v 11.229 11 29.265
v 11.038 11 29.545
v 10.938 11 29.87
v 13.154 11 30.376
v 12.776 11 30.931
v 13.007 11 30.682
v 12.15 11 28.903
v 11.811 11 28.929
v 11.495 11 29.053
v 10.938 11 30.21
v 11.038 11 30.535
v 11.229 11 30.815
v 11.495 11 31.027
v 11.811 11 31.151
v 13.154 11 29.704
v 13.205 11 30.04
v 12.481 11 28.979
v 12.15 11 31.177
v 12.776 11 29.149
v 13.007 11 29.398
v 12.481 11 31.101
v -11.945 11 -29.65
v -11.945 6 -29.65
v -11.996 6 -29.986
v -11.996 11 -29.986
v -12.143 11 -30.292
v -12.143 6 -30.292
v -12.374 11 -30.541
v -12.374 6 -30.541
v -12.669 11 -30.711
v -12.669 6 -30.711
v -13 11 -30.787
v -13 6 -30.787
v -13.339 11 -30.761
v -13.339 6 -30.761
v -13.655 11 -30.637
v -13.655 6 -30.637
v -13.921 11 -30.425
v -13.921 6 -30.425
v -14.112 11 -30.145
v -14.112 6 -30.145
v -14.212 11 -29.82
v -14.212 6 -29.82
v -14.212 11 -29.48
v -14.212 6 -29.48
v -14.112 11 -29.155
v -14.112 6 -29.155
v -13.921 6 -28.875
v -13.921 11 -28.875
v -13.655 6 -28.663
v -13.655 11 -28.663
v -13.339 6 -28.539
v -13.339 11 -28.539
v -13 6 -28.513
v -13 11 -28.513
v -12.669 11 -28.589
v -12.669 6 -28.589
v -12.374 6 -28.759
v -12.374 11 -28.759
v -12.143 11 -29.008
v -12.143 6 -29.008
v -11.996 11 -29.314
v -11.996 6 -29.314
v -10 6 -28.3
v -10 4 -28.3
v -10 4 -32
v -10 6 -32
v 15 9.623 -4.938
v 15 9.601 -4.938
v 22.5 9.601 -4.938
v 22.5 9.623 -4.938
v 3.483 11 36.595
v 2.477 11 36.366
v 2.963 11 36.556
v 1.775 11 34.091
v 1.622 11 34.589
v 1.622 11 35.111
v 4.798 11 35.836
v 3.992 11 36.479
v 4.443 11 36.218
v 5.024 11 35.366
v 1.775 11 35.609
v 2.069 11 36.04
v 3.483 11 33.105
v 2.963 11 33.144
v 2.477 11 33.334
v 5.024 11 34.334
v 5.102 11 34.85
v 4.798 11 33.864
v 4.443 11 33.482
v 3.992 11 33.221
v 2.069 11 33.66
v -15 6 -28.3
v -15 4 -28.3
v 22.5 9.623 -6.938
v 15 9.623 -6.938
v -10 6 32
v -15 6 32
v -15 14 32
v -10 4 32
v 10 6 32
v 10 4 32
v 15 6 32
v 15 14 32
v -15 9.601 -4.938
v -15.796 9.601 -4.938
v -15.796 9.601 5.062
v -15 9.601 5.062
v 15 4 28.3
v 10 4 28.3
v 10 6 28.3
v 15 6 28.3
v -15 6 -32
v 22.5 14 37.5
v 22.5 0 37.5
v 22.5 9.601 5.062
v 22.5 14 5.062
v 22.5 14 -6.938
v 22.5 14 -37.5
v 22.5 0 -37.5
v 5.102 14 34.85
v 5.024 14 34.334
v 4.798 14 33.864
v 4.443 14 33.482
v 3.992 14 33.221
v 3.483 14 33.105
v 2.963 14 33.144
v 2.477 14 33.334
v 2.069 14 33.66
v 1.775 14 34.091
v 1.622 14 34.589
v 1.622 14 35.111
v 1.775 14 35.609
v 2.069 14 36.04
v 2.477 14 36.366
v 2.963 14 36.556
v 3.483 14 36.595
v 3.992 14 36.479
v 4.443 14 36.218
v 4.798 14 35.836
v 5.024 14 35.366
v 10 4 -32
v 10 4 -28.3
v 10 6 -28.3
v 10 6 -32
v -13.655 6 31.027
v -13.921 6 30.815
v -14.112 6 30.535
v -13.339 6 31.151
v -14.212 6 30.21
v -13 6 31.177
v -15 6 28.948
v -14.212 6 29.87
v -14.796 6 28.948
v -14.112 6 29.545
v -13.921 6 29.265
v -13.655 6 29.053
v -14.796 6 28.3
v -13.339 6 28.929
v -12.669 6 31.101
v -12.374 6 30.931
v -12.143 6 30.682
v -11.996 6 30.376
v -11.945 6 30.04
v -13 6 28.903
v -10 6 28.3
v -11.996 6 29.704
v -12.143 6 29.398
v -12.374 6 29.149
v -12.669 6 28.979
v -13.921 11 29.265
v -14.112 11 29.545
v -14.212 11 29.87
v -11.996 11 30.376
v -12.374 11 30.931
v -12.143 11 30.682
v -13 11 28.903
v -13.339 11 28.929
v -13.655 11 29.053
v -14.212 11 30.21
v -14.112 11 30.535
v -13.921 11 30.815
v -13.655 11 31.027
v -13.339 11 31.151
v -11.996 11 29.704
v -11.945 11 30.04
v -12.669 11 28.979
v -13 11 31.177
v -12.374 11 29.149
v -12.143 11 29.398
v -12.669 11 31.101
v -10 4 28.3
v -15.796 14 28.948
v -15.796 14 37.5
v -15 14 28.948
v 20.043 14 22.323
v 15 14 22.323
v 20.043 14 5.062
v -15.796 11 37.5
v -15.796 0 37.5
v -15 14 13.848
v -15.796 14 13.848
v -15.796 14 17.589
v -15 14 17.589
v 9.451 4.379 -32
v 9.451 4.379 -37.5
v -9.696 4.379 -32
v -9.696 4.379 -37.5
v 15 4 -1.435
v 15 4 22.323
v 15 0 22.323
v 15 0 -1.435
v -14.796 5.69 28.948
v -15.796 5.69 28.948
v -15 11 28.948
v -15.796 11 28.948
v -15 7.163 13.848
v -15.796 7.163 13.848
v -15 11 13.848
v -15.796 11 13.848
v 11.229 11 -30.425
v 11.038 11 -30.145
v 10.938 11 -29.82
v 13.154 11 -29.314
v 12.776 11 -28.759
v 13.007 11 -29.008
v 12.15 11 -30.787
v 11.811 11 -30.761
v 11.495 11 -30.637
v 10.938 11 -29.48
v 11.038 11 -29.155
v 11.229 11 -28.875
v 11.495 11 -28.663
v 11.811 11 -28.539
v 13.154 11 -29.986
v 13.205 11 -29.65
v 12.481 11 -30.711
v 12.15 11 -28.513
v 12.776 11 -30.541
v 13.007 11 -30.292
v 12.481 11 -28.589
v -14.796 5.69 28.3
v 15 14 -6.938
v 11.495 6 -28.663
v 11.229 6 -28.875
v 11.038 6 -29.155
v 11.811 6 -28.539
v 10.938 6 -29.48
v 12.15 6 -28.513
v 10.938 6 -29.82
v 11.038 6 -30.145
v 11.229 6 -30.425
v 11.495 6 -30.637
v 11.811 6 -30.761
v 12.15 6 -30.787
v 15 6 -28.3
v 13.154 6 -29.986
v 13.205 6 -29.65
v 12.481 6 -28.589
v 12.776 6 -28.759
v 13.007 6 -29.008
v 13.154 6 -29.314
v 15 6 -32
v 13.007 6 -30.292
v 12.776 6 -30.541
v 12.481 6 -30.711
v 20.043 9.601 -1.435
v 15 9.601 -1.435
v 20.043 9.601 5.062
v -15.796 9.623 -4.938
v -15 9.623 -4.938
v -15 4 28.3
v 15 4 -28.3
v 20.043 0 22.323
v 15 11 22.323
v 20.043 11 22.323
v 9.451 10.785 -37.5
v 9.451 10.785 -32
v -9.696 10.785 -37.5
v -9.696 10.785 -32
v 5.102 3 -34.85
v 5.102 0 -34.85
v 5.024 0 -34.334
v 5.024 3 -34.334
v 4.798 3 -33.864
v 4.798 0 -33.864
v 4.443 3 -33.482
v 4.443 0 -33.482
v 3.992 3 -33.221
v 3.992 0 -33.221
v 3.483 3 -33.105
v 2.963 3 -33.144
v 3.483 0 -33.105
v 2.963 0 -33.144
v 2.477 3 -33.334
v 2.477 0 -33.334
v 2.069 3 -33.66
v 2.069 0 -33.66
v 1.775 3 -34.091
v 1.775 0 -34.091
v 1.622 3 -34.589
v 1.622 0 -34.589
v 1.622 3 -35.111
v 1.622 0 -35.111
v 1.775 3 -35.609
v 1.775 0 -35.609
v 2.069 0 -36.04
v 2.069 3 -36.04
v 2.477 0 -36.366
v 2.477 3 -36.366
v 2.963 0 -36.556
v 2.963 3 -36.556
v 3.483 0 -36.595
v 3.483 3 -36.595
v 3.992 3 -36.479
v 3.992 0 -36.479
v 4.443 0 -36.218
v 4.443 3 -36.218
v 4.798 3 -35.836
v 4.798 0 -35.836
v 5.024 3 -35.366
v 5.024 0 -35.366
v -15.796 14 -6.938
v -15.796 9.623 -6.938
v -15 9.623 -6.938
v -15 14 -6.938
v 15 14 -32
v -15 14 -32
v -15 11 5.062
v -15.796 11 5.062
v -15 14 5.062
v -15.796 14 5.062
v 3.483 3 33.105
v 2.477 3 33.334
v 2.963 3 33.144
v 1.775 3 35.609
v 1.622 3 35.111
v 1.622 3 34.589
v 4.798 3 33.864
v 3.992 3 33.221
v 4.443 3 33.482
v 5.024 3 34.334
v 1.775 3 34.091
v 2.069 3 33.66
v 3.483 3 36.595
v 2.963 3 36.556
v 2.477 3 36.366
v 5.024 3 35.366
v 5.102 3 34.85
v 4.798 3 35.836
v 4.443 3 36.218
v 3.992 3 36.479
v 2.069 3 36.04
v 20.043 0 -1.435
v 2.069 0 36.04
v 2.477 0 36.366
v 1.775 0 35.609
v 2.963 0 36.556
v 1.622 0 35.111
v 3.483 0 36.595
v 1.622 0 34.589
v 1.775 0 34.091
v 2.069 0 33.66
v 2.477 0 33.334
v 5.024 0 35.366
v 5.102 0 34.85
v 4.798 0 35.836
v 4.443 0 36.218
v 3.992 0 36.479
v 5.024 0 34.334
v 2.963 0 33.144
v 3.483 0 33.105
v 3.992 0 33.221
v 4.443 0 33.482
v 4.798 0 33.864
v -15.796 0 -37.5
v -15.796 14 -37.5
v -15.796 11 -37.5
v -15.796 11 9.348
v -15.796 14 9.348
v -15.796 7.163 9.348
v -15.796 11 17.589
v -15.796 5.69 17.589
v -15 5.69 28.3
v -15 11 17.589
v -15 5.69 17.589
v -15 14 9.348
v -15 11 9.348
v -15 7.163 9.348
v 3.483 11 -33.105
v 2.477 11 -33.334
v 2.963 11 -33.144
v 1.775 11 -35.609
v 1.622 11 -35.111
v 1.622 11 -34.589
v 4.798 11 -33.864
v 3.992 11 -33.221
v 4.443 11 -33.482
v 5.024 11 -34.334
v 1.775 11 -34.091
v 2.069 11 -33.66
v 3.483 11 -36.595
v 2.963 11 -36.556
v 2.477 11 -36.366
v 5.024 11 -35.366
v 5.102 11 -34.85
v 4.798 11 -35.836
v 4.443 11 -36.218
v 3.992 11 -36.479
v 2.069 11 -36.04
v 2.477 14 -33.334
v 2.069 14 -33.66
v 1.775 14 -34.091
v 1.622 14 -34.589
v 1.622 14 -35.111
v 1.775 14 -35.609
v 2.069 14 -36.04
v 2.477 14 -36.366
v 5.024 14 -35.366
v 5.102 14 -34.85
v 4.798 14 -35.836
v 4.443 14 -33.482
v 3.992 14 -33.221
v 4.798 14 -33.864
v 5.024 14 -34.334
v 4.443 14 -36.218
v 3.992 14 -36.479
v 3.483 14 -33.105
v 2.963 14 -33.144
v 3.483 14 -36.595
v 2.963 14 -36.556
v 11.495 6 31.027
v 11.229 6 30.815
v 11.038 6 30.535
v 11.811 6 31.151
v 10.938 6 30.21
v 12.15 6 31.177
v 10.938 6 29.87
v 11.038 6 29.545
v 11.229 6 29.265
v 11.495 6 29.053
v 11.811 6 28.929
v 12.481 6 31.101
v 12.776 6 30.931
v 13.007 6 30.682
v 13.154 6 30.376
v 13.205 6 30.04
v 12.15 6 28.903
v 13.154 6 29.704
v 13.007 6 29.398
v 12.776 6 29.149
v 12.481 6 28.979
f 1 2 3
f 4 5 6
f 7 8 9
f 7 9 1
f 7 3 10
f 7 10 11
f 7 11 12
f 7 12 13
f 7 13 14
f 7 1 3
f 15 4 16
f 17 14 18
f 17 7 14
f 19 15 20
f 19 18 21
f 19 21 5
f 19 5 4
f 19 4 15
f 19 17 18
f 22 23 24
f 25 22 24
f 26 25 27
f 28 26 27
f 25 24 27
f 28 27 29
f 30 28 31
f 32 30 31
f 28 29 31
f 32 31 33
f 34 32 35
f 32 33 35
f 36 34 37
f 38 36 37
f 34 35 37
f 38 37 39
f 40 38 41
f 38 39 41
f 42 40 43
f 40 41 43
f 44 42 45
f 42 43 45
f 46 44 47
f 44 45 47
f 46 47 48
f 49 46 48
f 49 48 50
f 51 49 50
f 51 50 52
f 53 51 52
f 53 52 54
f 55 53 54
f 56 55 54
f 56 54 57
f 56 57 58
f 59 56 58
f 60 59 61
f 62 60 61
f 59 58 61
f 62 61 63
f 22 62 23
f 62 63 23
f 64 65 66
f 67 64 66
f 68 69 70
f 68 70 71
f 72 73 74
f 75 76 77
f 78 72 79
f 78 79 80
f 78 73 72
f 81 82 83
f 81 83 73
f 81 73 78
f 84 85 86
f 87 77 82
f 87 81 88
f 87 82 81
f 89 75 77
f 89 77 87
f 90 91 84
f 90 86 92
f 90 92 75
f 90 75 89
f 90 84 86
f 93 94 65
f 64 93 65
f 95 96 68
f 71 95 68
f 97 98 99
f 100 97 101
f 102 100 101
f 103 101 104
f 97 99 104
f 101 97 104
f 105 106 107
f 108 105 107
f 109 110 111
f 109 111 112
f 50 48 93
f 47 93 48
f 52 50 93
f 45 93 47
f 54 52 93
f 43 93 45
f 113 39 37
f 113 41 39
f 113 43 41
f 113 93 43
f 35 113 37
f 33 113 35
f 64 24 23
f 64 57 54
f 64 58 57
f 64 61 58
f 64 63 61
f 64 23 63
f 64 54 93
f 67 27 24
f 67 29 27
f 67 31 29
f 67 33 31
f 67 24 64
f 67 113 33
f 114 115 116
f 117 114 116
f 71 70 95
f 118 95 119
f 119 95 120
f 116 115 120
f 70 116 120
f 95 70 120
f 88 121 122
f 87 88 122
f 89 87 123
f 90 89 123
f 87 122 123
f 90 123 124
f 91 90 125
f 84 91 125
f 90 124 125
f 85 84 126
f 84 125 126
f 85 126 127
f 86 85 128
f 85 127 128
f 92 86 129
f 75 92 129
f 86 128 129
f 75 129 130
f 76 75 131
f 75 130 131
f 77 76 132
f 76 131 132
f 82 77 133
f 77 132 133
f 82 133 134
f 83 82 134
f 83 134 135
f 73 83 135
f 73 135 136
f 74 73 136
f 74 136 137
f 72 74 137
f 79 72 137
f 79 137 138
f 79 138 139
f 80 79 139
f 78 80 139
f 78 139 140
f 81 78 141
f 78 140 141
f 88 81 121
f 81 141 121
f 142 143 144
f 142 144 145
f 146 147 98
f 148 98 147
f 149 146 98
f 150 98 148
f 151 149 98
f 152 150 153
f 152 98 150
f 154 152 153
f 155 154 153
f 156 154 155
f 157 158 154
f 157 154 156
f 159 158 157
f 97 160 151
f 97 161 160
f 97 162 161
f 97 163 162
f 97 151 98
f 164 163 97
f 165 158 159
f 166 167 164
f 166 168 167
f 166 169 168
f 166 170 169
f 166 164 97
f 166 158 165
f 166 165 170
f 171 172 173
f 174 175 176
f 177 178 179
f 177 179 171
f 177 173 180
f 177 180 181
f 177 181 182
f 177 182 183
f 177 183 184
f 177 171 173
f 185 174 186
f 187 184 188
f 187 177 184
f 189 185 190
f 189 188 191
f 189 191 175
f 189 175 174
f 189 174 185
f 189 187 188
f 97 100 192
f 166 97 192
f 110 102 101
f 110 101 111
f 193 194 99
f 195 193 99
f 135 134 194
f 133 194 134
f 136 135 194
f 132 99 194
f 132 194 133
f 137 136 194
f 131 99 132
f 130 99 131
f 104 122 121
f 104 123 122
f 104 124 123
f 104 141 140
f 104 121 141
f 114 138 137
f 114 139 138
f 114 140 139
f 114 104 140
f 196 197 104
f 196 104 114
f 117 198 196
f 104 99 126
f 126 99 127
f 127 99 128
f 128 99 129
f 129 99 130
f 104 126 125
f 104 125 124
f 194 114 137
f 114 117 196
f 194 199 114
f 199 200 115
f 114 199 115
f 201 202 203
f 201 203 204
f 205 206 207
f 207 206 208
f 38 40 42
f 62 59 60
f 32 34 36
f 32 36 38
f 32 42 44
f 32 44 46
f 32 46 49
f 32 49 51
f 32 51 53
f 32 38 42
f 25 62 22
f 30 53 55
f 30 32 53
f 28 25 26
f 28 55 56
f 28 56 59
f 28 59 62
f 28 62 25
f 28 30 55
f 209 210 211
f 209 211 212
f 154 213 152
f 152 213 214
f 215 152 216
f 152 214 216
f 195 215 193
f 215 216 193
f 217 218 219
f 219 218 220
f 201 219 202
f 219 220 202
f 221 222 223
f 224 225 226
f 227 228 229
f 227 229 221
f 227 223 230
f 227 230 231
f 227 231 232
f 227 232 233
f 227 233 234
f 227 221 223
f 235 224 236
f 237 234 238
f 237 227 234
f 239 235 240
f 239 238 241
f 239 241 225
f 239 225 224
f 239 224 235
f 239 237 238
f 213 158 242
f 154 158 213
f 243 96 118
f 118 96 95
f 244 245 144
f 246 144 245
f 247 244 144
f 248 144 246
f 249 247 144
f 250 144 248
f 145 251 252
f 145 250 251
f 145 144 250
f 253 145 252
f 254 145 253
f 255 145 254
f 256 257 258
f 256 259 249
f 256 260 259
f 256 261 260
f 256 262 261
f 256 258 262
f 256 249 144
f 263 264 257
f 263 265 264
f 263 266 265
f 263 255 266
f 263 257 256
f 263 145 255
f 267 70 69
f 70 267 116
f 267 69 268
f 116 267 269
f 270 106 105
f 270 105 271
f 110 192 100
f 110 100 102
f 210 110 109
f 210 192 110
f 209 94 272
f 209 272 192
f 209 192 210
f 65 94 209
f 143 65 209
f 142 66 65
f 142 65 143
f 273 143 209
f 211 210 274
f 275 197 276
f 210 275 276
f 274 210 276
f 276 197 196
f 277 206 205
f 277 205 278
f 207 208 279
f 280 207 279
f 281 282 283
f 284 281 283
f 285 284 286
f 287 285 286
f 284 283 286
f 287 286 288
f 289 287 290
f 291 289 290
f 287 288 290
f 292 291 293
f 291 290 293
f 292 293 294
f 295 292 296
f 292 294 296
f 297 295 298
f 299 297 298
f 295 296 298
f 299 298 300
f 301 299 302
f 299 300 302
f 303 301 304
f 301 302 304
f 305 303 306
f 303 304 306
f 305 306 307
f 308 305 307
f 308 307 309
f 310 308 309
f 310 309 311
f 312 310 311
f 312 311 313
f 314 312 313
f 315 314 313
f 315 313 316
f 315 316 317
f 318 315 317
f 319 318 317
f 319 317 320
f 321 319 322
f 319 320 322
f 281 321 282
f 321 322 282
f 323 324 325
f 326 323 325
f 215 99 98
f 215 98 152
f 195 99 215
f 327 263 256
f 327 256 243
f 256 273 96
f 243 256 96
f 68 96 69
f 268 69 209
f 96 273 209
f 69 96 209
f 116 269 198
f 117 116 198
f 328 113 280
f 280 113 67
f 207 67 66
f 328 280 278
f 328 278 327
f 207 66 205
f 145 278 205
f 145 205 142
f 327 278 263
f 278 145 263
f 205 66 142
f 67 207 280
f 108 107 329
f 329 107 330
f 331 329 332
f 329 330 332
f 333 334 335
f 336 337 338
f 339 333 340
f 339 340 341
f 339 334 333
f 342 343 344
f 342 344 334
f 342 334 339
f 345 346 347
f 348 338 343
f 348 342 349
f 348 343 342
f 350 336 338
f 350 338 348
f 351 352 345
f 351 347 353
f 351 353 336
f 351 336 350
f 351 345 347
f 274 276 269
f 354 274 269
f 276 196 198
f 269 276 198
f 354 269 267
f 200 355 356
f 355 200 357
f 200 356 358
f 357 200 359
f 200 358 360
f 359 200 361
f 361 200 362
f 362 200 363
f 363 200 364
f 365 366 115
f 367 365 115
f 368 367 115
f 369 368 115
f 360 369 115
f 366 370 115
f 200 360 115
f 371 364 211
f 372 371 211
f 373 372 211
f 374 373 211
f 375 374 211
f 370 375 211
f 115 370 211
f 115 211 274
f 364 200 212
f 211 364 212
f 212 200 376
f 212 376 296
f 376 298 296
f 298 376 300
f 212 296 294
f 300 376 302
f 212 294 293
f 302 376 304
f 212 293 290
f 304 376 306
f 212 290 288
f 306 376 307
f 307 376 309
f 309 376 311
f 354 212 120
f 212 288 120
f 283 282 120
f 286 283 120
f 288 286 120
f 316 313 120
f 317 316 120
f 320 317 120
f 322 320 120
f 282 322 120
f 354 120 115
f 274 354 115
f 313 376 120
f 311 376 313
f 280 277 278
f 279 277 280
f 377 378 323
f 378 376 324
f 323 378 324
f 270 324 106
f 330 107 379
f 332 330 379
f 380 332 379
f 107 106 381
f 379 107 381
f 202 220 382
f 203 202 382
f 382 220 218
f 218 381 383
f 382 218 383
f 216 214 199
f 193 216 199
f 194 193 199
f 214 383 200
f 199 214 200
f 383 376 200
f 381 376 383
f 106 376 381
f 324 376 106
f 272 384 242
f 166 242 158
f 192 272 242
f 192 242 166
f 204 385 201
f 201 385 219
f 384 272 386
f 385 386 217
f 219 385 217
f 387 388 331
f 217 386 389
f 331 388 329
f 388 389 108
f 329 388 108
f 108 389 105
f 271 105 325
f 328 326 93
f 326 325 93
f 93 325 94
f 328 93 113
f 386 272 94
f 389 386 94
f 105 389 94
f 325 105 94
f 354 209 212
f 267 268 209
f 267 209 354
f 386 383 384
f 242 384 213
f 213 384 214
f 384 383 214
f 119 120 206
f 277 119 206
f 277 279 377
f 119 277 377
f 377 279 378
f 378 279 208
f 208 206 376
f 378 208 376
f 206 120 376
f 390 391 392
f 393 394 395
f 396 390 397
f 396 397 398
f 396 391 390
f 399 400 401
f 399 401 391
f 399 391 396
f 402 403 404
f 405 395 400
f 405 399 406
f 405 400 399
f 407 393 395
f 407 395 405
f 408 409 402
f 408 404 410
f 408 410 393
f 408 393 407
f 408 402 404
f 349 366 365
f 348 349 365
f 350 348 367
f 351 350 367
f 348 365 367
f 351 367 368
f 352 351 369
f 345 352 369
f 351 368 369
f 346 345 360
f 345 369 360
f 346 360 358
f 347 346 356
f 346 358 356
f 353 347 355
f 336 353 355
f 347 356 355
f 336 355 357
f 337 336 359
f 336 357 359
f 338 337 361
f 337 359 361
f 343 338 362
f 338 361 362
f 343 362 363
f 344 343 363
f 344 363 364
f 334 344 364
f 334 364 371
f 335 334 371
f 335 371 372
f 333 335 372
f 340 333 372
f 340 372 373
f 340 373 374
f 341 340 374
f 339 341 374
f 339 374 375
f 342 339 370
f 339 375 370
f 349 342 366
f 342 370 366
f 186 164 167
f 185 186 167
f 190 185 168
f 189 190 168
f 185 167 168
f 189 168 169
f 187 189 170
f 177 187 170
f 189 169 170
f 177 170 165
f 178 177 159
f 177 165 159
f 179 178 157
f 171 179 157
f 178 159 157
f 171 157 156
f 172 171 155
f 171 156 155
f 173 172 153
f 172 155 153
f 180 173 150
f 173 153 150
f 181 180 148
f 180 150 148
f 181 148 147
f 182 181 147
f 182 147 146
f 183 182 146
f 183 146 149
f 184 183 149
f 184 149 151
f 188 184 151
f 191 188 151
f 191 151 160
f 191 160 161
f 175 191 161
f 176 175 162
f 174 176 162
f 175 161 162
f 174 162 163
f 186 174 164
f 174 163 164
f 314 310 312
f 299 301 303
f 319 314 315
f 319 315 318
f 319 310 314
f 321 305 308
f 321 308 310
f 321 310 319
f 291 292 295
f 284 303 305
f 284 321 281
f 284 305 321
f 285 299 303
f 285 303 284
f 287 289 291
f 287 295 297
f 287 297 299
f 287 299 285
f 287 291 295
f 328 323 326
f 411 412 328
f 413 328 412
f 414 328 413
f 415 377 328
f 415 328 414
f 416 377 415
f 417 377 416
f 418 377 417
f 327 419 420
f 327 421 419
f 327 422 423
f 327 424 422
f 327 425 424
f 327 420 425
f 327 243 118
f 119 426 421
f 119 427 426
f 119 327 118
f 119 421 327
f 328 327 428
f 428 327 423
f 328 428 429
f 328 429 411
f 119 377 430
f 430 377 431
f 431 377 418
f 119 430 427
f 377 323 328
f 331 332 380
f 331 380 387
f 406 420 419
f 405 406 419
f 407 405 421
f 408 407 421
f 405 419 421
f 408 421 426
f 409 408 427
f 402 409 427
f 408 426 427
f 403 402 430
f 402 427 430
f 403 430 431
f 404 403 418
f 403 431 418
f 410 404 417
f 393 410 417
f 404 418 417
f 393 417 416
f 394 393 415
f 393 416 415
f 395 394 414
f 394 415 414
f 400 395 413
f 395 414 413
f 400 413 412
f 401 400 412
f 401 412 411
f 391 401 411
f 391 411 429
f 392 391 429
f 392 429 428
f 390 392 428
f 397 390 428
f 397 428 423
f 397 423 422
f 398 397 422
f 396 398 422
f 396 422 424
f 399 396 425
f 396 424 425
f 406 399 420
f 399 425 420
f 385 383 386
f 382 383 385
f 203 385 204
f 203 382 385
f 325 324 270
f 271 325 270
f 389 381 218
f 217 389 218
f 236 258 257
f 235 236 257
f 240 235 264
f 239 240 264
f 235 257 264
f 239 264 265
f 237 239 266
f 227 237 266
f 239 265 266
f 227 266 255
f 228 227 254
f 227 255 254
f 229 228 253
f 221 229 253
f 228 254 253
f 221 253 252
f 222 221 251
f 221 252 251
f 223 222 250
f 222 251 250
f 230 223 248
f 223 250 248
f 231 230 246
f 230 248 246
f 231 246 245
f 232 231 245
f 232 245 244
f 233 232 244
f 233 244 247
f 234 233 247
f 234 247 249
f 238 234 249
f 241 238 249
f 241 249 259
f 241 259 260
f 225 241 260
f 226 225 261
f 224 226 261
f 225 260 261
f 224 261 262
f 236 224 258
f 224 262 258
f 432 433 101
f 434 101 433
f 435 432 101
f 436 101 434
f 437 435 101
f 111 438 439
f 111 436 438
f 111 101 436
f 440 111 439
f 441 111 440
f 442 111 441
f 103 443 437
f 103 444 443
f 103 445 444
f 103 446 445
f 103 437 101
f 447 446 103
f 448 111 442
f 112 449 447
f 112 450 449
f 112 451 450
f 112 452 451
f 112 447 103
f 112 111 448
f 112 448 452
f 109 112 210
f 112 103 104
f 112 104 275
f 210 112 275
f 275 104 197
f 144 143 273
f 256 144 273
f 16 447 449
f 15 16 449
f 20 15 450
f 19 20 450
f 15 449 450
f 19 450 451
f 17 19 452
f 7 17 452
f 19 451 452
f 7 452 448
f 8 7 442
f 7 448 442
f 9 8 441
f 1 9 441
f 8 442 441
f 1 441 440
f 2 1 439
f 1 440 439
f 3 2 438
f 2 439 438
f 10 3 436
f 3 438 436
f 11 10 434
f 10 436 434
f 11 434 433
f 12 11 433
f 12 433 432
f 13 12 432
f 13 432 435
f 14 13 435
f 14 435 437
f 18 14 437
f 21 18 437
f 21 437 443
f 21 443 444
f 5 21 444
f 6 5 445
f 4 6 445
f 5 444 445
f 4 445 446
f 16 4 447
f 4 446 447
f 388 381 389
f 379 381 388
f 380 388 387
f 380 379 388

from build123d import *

# Parameters (mm, degrees)
CROQUIS1_W              = 45
CROQUIS1_H              = 75
SALIENTE_EXTRUIR1_DEPTH = 11
CROQUIS2_W              = 30
CROQUIS2_H              = 64
CORTAR_EXTRUIR1_DEPTH   = 7
CROQUIS3_W              = 5
CROQUIS3_H              = 3.7
SALIENTE_EXTRUIR2_DEPTH = 2
CROQUIS4_R              = 1.14
SALIENTE_EXTRUIR3_DEPTH = 5
CROQUIS8_W              = 5.042710394
CROQUIS8_H              = 23.757603043
CORTAR_EXTRUIR2_DEPTH   = 12
CROQUIS10_W             = 6.704370917
CROQUIS10_H             = 75
CORTAR_EXTRUIR3_DEPTH   = 18
CROQUIS11_W             = 11.359484983
CROQUIS11_H             = 5.310310124
CROQUIS11_W_2           = 4.5
CROQUIS11_H_2           = 3.836618742
CORTAR_EXTRUIR4_DEPTH   = 1
CROQUIS13_W             = 10
CROQUIS13_H             = 1.398702395
CROQUIS13_W_2           = 3.73
CROQUIS13_H_2           = 1.377461041
CORTAR_EXTRUIR5_DEPTH   = 38.3
CROQUIS15_R             = 1.75
CORTAR_EXTRUIR7_DEPTH   = 3
CROQUIS16_W             = 19.147118229
CROQUIS16_H             = 6.405137331
CORTAR_EXTRUIR8_DEPTH   = 10
CROQUIS17_W             = 0.795629083
CROQUIS17_H             = 4.286046827
CROQUIS17_H_2           = 3.741316105
SALIENTE_EXTRUIR4_DEPTH = 3
CROQUIS18_R             = 1.75
CORTAR_EXTRUIR9_DEPTH   = 3


with BuildPart() as part:
    # Croquis1 → Saliente-Extruir1 (new body)
    with BuildSketch(Plane(origin=(0, 0, 0), x_dir=(1, 0, 0), z_dir=(0, 1, 0))):
        Rectangle(CROQUIS1_W, CROQUIS1_H)
    extrude(amount=SALIENTE_EXTRUIR1_DEPTH)

    # Croquis2 → Cortar-Extruir1 (cut)
    with BuildSketch(Plane(origin=(0, 11, 0), x_dir=(1, 0, 0), z_dir=(0, 1, 0))):
        Rectangle(CROQUIS2_W, CROQUIS2_H)
    extrude(amount=-CORTAR_EXTRUIR1_DEPTH, mode=Mode.SUBTRACT)

    # Croquis3 → Saliente-Extruir2 (add)
    with BuildSketch(Plane(origin=(0, 4, 0), x_dir=(1, 0, 0), z_dir=(0, 1, 0))):
        with Locations((12.5, -30.15)):
            Rectangle(CROQUIS3_W, CROQUIS3_H)
        with Locations((-12.5, -30.15)):
            Rectangle(CROQUIS3_W, CROQUIS3_H)
        with Locations((12.5, 30.15)):
            Rectangle(CROQUIS3_W, CROQUIS3_H)
        with Locations((-12.5, 30.15)):
            Rectangle(CROQUIS3_W, CROQUIS3_H)
    extrude(amount=SALIENTE_EXTRUIR2_DEPTH)

    # Croquis4 → Saliente-Extruir3 (add)
    with BuildSketch(Plane(origin=(0, 6, 0), x_dir=(1, 0, 0), z_dir=(0, 1, 0))):
        with Locations((-13.085, -30.04)):
            Circle(CROQUIS4_R)
        with Locations((12.065, -30.04)):
            Circle(CROQUIS4_R)
        with Locations((-13.085, 29.65)):
            Circle(CROQUIS4_R)
        with Locations((12.065, 29.65)):
            Circle(CROQUIS4_R)
    extrude(amount=SALIENTE_EXTRUIR3_DEPTH)

    # Croquis8 → Cortar-Extruir2 (cut)
    with BuildSketch(Plane(origin=(0, 11, 0), x_dir=(1, 0, 0), z_dir=(0, 1, 0))):
        with Locations((17.521355197, -10.443778519)):
            Rectangle(CROQUIS8_W, CROQUIS8_H)
    extrude(amount=-CORTAR_EXTRUIR2_DEPTH, mode=Mode.SUBTRACT)

    # Croquis10 → Cortar-Extruir3 (cut)
    with BuildSketch(Plane(origin=(0, 11, 0), x_dir=(1, 0, 0), z_dir=(0, 1, 0))):
        with Locations((-19.147814542, 0)):
            Rectangle(CROQUIS10_W, CROQUIS10_H)
    extrude(amount=-CORTAR_EXTRUIR3_DEPTH, mode=Mode.SUBTRACT)

    # Croquis11 → Cortar-Extruir4 (cut)
    with BuildSketch(Plane.ZY.offset(15.795629083)):
        with Locations((23.268650218, 8.344844938)):
            Rectangle(CROQUIS11_W, CROQUIS11_H)
        with Locations((11.597591621, 9.081690629)):
            Rectangle(CROQUIS11_W_2, CROQUIS11_H_2)
    extrude(amount=-CORTAR_EXTRUIR4_DEPTH, mode=Mode.SUBTRACT)

    # Croquis13 → Cortar-Extruir5 (cut)
    with BuildSketch(Plane.ZY.offset(15.795629083)):
        with Locations((0.061544794, 10.300648802)):
            Rectangle(CROQUIS13_W, CROQUIS13_H)
        with Locations((-5.073455206, 10.311269479)):
            Rectangle(CROQUIS13_W_2, CROQUIS13_H_2)
    extrude(amount=-CORTAR_EXTRUIR5_DEPTH, mode=Mode.SUBTRACT)

    # Croquis15 → Cortar-Extruir7 (cut)
    with BuildSketch(Plane.XZ):
        with Locations((3.352185458, -34.85)):
            Circle(CROQUIS15_R)
        with Locations((3.352185458, 34.85)):
            Circle(CROQUIS15_R)
    extrude(amount=-CORTAR_EXTRUIR7_DEPTH, mode=Mode.SUBTRACT)

    # Croquis16 → Cortar-Extruir8 (cut)
    with BuildSketch(Plane(origin=(0, 0, -37.5), x_dir=(-1, 0, 0), z_dir=(0, 0, -1))):
        with Locations((0.122687914, 7.582003397)):
            Rectangle(CROQUIS16_W, CROQUIS16_H)
    extrude(amount=-CORTAR_EXTRUIR8_DEPTH, mode=Mode.SUBTRACT)

    # Croquis17 → Saliente-Extruir4 (add)
    with BuildSketch(Plane(origin=(0, 11, 0), x_dir=(1, 0, 0), z_dir=(0, 1, 0))):
        Polygon((-15.795629083, 6.938455206), (-15, 6.938455206), (-15, 32), (15, 32), (15, 6.938455206), (22.5, 6.938455206), (22.5, 37.5), (-15.795629083, 37.5), align=None)
        with Locations((-15.397814542, -7.204568208)):
            Rectangle(CROQUIS17_W, CROQUIS17_H)
        with Locations((-15.397814542, -15.718249674)):
            Rectangle(CROQUIS17_W, CROQUIS17_H_2)
        Polygon((22.5, -5.061544794), (20.042710394, -5.061544794), (20.042710394, -22.32258004), (15, -22.32258004), (15, -32), (-15, -32), (-15, -28.948392709), (-15.795629083, -28.948392709), (-15.795629083, -37.5), (22.5, -37.5), align=None)
    extrude(amount=SALIENTE_EXTRUIR4_DEPTH)

    # Croquis18 → Cortar-Extruir9 (cut)
    with BuildSketch(Plane(origin=(0, 14, 0), x_dir=(1, 0, 0), z_dir=(0, 1, 0))):
        with Locations((3.352185458, -34.85)):
            Circle(CROQUIS18_R)
        with Locations((3.352185458, 34.85)):
            Circle(CROQUIS18_R)
    extrude(amount=-CORTAR_EXTRUIR9_DEPTH, mode=Mode.SUBTRACT)


solid = part.part
